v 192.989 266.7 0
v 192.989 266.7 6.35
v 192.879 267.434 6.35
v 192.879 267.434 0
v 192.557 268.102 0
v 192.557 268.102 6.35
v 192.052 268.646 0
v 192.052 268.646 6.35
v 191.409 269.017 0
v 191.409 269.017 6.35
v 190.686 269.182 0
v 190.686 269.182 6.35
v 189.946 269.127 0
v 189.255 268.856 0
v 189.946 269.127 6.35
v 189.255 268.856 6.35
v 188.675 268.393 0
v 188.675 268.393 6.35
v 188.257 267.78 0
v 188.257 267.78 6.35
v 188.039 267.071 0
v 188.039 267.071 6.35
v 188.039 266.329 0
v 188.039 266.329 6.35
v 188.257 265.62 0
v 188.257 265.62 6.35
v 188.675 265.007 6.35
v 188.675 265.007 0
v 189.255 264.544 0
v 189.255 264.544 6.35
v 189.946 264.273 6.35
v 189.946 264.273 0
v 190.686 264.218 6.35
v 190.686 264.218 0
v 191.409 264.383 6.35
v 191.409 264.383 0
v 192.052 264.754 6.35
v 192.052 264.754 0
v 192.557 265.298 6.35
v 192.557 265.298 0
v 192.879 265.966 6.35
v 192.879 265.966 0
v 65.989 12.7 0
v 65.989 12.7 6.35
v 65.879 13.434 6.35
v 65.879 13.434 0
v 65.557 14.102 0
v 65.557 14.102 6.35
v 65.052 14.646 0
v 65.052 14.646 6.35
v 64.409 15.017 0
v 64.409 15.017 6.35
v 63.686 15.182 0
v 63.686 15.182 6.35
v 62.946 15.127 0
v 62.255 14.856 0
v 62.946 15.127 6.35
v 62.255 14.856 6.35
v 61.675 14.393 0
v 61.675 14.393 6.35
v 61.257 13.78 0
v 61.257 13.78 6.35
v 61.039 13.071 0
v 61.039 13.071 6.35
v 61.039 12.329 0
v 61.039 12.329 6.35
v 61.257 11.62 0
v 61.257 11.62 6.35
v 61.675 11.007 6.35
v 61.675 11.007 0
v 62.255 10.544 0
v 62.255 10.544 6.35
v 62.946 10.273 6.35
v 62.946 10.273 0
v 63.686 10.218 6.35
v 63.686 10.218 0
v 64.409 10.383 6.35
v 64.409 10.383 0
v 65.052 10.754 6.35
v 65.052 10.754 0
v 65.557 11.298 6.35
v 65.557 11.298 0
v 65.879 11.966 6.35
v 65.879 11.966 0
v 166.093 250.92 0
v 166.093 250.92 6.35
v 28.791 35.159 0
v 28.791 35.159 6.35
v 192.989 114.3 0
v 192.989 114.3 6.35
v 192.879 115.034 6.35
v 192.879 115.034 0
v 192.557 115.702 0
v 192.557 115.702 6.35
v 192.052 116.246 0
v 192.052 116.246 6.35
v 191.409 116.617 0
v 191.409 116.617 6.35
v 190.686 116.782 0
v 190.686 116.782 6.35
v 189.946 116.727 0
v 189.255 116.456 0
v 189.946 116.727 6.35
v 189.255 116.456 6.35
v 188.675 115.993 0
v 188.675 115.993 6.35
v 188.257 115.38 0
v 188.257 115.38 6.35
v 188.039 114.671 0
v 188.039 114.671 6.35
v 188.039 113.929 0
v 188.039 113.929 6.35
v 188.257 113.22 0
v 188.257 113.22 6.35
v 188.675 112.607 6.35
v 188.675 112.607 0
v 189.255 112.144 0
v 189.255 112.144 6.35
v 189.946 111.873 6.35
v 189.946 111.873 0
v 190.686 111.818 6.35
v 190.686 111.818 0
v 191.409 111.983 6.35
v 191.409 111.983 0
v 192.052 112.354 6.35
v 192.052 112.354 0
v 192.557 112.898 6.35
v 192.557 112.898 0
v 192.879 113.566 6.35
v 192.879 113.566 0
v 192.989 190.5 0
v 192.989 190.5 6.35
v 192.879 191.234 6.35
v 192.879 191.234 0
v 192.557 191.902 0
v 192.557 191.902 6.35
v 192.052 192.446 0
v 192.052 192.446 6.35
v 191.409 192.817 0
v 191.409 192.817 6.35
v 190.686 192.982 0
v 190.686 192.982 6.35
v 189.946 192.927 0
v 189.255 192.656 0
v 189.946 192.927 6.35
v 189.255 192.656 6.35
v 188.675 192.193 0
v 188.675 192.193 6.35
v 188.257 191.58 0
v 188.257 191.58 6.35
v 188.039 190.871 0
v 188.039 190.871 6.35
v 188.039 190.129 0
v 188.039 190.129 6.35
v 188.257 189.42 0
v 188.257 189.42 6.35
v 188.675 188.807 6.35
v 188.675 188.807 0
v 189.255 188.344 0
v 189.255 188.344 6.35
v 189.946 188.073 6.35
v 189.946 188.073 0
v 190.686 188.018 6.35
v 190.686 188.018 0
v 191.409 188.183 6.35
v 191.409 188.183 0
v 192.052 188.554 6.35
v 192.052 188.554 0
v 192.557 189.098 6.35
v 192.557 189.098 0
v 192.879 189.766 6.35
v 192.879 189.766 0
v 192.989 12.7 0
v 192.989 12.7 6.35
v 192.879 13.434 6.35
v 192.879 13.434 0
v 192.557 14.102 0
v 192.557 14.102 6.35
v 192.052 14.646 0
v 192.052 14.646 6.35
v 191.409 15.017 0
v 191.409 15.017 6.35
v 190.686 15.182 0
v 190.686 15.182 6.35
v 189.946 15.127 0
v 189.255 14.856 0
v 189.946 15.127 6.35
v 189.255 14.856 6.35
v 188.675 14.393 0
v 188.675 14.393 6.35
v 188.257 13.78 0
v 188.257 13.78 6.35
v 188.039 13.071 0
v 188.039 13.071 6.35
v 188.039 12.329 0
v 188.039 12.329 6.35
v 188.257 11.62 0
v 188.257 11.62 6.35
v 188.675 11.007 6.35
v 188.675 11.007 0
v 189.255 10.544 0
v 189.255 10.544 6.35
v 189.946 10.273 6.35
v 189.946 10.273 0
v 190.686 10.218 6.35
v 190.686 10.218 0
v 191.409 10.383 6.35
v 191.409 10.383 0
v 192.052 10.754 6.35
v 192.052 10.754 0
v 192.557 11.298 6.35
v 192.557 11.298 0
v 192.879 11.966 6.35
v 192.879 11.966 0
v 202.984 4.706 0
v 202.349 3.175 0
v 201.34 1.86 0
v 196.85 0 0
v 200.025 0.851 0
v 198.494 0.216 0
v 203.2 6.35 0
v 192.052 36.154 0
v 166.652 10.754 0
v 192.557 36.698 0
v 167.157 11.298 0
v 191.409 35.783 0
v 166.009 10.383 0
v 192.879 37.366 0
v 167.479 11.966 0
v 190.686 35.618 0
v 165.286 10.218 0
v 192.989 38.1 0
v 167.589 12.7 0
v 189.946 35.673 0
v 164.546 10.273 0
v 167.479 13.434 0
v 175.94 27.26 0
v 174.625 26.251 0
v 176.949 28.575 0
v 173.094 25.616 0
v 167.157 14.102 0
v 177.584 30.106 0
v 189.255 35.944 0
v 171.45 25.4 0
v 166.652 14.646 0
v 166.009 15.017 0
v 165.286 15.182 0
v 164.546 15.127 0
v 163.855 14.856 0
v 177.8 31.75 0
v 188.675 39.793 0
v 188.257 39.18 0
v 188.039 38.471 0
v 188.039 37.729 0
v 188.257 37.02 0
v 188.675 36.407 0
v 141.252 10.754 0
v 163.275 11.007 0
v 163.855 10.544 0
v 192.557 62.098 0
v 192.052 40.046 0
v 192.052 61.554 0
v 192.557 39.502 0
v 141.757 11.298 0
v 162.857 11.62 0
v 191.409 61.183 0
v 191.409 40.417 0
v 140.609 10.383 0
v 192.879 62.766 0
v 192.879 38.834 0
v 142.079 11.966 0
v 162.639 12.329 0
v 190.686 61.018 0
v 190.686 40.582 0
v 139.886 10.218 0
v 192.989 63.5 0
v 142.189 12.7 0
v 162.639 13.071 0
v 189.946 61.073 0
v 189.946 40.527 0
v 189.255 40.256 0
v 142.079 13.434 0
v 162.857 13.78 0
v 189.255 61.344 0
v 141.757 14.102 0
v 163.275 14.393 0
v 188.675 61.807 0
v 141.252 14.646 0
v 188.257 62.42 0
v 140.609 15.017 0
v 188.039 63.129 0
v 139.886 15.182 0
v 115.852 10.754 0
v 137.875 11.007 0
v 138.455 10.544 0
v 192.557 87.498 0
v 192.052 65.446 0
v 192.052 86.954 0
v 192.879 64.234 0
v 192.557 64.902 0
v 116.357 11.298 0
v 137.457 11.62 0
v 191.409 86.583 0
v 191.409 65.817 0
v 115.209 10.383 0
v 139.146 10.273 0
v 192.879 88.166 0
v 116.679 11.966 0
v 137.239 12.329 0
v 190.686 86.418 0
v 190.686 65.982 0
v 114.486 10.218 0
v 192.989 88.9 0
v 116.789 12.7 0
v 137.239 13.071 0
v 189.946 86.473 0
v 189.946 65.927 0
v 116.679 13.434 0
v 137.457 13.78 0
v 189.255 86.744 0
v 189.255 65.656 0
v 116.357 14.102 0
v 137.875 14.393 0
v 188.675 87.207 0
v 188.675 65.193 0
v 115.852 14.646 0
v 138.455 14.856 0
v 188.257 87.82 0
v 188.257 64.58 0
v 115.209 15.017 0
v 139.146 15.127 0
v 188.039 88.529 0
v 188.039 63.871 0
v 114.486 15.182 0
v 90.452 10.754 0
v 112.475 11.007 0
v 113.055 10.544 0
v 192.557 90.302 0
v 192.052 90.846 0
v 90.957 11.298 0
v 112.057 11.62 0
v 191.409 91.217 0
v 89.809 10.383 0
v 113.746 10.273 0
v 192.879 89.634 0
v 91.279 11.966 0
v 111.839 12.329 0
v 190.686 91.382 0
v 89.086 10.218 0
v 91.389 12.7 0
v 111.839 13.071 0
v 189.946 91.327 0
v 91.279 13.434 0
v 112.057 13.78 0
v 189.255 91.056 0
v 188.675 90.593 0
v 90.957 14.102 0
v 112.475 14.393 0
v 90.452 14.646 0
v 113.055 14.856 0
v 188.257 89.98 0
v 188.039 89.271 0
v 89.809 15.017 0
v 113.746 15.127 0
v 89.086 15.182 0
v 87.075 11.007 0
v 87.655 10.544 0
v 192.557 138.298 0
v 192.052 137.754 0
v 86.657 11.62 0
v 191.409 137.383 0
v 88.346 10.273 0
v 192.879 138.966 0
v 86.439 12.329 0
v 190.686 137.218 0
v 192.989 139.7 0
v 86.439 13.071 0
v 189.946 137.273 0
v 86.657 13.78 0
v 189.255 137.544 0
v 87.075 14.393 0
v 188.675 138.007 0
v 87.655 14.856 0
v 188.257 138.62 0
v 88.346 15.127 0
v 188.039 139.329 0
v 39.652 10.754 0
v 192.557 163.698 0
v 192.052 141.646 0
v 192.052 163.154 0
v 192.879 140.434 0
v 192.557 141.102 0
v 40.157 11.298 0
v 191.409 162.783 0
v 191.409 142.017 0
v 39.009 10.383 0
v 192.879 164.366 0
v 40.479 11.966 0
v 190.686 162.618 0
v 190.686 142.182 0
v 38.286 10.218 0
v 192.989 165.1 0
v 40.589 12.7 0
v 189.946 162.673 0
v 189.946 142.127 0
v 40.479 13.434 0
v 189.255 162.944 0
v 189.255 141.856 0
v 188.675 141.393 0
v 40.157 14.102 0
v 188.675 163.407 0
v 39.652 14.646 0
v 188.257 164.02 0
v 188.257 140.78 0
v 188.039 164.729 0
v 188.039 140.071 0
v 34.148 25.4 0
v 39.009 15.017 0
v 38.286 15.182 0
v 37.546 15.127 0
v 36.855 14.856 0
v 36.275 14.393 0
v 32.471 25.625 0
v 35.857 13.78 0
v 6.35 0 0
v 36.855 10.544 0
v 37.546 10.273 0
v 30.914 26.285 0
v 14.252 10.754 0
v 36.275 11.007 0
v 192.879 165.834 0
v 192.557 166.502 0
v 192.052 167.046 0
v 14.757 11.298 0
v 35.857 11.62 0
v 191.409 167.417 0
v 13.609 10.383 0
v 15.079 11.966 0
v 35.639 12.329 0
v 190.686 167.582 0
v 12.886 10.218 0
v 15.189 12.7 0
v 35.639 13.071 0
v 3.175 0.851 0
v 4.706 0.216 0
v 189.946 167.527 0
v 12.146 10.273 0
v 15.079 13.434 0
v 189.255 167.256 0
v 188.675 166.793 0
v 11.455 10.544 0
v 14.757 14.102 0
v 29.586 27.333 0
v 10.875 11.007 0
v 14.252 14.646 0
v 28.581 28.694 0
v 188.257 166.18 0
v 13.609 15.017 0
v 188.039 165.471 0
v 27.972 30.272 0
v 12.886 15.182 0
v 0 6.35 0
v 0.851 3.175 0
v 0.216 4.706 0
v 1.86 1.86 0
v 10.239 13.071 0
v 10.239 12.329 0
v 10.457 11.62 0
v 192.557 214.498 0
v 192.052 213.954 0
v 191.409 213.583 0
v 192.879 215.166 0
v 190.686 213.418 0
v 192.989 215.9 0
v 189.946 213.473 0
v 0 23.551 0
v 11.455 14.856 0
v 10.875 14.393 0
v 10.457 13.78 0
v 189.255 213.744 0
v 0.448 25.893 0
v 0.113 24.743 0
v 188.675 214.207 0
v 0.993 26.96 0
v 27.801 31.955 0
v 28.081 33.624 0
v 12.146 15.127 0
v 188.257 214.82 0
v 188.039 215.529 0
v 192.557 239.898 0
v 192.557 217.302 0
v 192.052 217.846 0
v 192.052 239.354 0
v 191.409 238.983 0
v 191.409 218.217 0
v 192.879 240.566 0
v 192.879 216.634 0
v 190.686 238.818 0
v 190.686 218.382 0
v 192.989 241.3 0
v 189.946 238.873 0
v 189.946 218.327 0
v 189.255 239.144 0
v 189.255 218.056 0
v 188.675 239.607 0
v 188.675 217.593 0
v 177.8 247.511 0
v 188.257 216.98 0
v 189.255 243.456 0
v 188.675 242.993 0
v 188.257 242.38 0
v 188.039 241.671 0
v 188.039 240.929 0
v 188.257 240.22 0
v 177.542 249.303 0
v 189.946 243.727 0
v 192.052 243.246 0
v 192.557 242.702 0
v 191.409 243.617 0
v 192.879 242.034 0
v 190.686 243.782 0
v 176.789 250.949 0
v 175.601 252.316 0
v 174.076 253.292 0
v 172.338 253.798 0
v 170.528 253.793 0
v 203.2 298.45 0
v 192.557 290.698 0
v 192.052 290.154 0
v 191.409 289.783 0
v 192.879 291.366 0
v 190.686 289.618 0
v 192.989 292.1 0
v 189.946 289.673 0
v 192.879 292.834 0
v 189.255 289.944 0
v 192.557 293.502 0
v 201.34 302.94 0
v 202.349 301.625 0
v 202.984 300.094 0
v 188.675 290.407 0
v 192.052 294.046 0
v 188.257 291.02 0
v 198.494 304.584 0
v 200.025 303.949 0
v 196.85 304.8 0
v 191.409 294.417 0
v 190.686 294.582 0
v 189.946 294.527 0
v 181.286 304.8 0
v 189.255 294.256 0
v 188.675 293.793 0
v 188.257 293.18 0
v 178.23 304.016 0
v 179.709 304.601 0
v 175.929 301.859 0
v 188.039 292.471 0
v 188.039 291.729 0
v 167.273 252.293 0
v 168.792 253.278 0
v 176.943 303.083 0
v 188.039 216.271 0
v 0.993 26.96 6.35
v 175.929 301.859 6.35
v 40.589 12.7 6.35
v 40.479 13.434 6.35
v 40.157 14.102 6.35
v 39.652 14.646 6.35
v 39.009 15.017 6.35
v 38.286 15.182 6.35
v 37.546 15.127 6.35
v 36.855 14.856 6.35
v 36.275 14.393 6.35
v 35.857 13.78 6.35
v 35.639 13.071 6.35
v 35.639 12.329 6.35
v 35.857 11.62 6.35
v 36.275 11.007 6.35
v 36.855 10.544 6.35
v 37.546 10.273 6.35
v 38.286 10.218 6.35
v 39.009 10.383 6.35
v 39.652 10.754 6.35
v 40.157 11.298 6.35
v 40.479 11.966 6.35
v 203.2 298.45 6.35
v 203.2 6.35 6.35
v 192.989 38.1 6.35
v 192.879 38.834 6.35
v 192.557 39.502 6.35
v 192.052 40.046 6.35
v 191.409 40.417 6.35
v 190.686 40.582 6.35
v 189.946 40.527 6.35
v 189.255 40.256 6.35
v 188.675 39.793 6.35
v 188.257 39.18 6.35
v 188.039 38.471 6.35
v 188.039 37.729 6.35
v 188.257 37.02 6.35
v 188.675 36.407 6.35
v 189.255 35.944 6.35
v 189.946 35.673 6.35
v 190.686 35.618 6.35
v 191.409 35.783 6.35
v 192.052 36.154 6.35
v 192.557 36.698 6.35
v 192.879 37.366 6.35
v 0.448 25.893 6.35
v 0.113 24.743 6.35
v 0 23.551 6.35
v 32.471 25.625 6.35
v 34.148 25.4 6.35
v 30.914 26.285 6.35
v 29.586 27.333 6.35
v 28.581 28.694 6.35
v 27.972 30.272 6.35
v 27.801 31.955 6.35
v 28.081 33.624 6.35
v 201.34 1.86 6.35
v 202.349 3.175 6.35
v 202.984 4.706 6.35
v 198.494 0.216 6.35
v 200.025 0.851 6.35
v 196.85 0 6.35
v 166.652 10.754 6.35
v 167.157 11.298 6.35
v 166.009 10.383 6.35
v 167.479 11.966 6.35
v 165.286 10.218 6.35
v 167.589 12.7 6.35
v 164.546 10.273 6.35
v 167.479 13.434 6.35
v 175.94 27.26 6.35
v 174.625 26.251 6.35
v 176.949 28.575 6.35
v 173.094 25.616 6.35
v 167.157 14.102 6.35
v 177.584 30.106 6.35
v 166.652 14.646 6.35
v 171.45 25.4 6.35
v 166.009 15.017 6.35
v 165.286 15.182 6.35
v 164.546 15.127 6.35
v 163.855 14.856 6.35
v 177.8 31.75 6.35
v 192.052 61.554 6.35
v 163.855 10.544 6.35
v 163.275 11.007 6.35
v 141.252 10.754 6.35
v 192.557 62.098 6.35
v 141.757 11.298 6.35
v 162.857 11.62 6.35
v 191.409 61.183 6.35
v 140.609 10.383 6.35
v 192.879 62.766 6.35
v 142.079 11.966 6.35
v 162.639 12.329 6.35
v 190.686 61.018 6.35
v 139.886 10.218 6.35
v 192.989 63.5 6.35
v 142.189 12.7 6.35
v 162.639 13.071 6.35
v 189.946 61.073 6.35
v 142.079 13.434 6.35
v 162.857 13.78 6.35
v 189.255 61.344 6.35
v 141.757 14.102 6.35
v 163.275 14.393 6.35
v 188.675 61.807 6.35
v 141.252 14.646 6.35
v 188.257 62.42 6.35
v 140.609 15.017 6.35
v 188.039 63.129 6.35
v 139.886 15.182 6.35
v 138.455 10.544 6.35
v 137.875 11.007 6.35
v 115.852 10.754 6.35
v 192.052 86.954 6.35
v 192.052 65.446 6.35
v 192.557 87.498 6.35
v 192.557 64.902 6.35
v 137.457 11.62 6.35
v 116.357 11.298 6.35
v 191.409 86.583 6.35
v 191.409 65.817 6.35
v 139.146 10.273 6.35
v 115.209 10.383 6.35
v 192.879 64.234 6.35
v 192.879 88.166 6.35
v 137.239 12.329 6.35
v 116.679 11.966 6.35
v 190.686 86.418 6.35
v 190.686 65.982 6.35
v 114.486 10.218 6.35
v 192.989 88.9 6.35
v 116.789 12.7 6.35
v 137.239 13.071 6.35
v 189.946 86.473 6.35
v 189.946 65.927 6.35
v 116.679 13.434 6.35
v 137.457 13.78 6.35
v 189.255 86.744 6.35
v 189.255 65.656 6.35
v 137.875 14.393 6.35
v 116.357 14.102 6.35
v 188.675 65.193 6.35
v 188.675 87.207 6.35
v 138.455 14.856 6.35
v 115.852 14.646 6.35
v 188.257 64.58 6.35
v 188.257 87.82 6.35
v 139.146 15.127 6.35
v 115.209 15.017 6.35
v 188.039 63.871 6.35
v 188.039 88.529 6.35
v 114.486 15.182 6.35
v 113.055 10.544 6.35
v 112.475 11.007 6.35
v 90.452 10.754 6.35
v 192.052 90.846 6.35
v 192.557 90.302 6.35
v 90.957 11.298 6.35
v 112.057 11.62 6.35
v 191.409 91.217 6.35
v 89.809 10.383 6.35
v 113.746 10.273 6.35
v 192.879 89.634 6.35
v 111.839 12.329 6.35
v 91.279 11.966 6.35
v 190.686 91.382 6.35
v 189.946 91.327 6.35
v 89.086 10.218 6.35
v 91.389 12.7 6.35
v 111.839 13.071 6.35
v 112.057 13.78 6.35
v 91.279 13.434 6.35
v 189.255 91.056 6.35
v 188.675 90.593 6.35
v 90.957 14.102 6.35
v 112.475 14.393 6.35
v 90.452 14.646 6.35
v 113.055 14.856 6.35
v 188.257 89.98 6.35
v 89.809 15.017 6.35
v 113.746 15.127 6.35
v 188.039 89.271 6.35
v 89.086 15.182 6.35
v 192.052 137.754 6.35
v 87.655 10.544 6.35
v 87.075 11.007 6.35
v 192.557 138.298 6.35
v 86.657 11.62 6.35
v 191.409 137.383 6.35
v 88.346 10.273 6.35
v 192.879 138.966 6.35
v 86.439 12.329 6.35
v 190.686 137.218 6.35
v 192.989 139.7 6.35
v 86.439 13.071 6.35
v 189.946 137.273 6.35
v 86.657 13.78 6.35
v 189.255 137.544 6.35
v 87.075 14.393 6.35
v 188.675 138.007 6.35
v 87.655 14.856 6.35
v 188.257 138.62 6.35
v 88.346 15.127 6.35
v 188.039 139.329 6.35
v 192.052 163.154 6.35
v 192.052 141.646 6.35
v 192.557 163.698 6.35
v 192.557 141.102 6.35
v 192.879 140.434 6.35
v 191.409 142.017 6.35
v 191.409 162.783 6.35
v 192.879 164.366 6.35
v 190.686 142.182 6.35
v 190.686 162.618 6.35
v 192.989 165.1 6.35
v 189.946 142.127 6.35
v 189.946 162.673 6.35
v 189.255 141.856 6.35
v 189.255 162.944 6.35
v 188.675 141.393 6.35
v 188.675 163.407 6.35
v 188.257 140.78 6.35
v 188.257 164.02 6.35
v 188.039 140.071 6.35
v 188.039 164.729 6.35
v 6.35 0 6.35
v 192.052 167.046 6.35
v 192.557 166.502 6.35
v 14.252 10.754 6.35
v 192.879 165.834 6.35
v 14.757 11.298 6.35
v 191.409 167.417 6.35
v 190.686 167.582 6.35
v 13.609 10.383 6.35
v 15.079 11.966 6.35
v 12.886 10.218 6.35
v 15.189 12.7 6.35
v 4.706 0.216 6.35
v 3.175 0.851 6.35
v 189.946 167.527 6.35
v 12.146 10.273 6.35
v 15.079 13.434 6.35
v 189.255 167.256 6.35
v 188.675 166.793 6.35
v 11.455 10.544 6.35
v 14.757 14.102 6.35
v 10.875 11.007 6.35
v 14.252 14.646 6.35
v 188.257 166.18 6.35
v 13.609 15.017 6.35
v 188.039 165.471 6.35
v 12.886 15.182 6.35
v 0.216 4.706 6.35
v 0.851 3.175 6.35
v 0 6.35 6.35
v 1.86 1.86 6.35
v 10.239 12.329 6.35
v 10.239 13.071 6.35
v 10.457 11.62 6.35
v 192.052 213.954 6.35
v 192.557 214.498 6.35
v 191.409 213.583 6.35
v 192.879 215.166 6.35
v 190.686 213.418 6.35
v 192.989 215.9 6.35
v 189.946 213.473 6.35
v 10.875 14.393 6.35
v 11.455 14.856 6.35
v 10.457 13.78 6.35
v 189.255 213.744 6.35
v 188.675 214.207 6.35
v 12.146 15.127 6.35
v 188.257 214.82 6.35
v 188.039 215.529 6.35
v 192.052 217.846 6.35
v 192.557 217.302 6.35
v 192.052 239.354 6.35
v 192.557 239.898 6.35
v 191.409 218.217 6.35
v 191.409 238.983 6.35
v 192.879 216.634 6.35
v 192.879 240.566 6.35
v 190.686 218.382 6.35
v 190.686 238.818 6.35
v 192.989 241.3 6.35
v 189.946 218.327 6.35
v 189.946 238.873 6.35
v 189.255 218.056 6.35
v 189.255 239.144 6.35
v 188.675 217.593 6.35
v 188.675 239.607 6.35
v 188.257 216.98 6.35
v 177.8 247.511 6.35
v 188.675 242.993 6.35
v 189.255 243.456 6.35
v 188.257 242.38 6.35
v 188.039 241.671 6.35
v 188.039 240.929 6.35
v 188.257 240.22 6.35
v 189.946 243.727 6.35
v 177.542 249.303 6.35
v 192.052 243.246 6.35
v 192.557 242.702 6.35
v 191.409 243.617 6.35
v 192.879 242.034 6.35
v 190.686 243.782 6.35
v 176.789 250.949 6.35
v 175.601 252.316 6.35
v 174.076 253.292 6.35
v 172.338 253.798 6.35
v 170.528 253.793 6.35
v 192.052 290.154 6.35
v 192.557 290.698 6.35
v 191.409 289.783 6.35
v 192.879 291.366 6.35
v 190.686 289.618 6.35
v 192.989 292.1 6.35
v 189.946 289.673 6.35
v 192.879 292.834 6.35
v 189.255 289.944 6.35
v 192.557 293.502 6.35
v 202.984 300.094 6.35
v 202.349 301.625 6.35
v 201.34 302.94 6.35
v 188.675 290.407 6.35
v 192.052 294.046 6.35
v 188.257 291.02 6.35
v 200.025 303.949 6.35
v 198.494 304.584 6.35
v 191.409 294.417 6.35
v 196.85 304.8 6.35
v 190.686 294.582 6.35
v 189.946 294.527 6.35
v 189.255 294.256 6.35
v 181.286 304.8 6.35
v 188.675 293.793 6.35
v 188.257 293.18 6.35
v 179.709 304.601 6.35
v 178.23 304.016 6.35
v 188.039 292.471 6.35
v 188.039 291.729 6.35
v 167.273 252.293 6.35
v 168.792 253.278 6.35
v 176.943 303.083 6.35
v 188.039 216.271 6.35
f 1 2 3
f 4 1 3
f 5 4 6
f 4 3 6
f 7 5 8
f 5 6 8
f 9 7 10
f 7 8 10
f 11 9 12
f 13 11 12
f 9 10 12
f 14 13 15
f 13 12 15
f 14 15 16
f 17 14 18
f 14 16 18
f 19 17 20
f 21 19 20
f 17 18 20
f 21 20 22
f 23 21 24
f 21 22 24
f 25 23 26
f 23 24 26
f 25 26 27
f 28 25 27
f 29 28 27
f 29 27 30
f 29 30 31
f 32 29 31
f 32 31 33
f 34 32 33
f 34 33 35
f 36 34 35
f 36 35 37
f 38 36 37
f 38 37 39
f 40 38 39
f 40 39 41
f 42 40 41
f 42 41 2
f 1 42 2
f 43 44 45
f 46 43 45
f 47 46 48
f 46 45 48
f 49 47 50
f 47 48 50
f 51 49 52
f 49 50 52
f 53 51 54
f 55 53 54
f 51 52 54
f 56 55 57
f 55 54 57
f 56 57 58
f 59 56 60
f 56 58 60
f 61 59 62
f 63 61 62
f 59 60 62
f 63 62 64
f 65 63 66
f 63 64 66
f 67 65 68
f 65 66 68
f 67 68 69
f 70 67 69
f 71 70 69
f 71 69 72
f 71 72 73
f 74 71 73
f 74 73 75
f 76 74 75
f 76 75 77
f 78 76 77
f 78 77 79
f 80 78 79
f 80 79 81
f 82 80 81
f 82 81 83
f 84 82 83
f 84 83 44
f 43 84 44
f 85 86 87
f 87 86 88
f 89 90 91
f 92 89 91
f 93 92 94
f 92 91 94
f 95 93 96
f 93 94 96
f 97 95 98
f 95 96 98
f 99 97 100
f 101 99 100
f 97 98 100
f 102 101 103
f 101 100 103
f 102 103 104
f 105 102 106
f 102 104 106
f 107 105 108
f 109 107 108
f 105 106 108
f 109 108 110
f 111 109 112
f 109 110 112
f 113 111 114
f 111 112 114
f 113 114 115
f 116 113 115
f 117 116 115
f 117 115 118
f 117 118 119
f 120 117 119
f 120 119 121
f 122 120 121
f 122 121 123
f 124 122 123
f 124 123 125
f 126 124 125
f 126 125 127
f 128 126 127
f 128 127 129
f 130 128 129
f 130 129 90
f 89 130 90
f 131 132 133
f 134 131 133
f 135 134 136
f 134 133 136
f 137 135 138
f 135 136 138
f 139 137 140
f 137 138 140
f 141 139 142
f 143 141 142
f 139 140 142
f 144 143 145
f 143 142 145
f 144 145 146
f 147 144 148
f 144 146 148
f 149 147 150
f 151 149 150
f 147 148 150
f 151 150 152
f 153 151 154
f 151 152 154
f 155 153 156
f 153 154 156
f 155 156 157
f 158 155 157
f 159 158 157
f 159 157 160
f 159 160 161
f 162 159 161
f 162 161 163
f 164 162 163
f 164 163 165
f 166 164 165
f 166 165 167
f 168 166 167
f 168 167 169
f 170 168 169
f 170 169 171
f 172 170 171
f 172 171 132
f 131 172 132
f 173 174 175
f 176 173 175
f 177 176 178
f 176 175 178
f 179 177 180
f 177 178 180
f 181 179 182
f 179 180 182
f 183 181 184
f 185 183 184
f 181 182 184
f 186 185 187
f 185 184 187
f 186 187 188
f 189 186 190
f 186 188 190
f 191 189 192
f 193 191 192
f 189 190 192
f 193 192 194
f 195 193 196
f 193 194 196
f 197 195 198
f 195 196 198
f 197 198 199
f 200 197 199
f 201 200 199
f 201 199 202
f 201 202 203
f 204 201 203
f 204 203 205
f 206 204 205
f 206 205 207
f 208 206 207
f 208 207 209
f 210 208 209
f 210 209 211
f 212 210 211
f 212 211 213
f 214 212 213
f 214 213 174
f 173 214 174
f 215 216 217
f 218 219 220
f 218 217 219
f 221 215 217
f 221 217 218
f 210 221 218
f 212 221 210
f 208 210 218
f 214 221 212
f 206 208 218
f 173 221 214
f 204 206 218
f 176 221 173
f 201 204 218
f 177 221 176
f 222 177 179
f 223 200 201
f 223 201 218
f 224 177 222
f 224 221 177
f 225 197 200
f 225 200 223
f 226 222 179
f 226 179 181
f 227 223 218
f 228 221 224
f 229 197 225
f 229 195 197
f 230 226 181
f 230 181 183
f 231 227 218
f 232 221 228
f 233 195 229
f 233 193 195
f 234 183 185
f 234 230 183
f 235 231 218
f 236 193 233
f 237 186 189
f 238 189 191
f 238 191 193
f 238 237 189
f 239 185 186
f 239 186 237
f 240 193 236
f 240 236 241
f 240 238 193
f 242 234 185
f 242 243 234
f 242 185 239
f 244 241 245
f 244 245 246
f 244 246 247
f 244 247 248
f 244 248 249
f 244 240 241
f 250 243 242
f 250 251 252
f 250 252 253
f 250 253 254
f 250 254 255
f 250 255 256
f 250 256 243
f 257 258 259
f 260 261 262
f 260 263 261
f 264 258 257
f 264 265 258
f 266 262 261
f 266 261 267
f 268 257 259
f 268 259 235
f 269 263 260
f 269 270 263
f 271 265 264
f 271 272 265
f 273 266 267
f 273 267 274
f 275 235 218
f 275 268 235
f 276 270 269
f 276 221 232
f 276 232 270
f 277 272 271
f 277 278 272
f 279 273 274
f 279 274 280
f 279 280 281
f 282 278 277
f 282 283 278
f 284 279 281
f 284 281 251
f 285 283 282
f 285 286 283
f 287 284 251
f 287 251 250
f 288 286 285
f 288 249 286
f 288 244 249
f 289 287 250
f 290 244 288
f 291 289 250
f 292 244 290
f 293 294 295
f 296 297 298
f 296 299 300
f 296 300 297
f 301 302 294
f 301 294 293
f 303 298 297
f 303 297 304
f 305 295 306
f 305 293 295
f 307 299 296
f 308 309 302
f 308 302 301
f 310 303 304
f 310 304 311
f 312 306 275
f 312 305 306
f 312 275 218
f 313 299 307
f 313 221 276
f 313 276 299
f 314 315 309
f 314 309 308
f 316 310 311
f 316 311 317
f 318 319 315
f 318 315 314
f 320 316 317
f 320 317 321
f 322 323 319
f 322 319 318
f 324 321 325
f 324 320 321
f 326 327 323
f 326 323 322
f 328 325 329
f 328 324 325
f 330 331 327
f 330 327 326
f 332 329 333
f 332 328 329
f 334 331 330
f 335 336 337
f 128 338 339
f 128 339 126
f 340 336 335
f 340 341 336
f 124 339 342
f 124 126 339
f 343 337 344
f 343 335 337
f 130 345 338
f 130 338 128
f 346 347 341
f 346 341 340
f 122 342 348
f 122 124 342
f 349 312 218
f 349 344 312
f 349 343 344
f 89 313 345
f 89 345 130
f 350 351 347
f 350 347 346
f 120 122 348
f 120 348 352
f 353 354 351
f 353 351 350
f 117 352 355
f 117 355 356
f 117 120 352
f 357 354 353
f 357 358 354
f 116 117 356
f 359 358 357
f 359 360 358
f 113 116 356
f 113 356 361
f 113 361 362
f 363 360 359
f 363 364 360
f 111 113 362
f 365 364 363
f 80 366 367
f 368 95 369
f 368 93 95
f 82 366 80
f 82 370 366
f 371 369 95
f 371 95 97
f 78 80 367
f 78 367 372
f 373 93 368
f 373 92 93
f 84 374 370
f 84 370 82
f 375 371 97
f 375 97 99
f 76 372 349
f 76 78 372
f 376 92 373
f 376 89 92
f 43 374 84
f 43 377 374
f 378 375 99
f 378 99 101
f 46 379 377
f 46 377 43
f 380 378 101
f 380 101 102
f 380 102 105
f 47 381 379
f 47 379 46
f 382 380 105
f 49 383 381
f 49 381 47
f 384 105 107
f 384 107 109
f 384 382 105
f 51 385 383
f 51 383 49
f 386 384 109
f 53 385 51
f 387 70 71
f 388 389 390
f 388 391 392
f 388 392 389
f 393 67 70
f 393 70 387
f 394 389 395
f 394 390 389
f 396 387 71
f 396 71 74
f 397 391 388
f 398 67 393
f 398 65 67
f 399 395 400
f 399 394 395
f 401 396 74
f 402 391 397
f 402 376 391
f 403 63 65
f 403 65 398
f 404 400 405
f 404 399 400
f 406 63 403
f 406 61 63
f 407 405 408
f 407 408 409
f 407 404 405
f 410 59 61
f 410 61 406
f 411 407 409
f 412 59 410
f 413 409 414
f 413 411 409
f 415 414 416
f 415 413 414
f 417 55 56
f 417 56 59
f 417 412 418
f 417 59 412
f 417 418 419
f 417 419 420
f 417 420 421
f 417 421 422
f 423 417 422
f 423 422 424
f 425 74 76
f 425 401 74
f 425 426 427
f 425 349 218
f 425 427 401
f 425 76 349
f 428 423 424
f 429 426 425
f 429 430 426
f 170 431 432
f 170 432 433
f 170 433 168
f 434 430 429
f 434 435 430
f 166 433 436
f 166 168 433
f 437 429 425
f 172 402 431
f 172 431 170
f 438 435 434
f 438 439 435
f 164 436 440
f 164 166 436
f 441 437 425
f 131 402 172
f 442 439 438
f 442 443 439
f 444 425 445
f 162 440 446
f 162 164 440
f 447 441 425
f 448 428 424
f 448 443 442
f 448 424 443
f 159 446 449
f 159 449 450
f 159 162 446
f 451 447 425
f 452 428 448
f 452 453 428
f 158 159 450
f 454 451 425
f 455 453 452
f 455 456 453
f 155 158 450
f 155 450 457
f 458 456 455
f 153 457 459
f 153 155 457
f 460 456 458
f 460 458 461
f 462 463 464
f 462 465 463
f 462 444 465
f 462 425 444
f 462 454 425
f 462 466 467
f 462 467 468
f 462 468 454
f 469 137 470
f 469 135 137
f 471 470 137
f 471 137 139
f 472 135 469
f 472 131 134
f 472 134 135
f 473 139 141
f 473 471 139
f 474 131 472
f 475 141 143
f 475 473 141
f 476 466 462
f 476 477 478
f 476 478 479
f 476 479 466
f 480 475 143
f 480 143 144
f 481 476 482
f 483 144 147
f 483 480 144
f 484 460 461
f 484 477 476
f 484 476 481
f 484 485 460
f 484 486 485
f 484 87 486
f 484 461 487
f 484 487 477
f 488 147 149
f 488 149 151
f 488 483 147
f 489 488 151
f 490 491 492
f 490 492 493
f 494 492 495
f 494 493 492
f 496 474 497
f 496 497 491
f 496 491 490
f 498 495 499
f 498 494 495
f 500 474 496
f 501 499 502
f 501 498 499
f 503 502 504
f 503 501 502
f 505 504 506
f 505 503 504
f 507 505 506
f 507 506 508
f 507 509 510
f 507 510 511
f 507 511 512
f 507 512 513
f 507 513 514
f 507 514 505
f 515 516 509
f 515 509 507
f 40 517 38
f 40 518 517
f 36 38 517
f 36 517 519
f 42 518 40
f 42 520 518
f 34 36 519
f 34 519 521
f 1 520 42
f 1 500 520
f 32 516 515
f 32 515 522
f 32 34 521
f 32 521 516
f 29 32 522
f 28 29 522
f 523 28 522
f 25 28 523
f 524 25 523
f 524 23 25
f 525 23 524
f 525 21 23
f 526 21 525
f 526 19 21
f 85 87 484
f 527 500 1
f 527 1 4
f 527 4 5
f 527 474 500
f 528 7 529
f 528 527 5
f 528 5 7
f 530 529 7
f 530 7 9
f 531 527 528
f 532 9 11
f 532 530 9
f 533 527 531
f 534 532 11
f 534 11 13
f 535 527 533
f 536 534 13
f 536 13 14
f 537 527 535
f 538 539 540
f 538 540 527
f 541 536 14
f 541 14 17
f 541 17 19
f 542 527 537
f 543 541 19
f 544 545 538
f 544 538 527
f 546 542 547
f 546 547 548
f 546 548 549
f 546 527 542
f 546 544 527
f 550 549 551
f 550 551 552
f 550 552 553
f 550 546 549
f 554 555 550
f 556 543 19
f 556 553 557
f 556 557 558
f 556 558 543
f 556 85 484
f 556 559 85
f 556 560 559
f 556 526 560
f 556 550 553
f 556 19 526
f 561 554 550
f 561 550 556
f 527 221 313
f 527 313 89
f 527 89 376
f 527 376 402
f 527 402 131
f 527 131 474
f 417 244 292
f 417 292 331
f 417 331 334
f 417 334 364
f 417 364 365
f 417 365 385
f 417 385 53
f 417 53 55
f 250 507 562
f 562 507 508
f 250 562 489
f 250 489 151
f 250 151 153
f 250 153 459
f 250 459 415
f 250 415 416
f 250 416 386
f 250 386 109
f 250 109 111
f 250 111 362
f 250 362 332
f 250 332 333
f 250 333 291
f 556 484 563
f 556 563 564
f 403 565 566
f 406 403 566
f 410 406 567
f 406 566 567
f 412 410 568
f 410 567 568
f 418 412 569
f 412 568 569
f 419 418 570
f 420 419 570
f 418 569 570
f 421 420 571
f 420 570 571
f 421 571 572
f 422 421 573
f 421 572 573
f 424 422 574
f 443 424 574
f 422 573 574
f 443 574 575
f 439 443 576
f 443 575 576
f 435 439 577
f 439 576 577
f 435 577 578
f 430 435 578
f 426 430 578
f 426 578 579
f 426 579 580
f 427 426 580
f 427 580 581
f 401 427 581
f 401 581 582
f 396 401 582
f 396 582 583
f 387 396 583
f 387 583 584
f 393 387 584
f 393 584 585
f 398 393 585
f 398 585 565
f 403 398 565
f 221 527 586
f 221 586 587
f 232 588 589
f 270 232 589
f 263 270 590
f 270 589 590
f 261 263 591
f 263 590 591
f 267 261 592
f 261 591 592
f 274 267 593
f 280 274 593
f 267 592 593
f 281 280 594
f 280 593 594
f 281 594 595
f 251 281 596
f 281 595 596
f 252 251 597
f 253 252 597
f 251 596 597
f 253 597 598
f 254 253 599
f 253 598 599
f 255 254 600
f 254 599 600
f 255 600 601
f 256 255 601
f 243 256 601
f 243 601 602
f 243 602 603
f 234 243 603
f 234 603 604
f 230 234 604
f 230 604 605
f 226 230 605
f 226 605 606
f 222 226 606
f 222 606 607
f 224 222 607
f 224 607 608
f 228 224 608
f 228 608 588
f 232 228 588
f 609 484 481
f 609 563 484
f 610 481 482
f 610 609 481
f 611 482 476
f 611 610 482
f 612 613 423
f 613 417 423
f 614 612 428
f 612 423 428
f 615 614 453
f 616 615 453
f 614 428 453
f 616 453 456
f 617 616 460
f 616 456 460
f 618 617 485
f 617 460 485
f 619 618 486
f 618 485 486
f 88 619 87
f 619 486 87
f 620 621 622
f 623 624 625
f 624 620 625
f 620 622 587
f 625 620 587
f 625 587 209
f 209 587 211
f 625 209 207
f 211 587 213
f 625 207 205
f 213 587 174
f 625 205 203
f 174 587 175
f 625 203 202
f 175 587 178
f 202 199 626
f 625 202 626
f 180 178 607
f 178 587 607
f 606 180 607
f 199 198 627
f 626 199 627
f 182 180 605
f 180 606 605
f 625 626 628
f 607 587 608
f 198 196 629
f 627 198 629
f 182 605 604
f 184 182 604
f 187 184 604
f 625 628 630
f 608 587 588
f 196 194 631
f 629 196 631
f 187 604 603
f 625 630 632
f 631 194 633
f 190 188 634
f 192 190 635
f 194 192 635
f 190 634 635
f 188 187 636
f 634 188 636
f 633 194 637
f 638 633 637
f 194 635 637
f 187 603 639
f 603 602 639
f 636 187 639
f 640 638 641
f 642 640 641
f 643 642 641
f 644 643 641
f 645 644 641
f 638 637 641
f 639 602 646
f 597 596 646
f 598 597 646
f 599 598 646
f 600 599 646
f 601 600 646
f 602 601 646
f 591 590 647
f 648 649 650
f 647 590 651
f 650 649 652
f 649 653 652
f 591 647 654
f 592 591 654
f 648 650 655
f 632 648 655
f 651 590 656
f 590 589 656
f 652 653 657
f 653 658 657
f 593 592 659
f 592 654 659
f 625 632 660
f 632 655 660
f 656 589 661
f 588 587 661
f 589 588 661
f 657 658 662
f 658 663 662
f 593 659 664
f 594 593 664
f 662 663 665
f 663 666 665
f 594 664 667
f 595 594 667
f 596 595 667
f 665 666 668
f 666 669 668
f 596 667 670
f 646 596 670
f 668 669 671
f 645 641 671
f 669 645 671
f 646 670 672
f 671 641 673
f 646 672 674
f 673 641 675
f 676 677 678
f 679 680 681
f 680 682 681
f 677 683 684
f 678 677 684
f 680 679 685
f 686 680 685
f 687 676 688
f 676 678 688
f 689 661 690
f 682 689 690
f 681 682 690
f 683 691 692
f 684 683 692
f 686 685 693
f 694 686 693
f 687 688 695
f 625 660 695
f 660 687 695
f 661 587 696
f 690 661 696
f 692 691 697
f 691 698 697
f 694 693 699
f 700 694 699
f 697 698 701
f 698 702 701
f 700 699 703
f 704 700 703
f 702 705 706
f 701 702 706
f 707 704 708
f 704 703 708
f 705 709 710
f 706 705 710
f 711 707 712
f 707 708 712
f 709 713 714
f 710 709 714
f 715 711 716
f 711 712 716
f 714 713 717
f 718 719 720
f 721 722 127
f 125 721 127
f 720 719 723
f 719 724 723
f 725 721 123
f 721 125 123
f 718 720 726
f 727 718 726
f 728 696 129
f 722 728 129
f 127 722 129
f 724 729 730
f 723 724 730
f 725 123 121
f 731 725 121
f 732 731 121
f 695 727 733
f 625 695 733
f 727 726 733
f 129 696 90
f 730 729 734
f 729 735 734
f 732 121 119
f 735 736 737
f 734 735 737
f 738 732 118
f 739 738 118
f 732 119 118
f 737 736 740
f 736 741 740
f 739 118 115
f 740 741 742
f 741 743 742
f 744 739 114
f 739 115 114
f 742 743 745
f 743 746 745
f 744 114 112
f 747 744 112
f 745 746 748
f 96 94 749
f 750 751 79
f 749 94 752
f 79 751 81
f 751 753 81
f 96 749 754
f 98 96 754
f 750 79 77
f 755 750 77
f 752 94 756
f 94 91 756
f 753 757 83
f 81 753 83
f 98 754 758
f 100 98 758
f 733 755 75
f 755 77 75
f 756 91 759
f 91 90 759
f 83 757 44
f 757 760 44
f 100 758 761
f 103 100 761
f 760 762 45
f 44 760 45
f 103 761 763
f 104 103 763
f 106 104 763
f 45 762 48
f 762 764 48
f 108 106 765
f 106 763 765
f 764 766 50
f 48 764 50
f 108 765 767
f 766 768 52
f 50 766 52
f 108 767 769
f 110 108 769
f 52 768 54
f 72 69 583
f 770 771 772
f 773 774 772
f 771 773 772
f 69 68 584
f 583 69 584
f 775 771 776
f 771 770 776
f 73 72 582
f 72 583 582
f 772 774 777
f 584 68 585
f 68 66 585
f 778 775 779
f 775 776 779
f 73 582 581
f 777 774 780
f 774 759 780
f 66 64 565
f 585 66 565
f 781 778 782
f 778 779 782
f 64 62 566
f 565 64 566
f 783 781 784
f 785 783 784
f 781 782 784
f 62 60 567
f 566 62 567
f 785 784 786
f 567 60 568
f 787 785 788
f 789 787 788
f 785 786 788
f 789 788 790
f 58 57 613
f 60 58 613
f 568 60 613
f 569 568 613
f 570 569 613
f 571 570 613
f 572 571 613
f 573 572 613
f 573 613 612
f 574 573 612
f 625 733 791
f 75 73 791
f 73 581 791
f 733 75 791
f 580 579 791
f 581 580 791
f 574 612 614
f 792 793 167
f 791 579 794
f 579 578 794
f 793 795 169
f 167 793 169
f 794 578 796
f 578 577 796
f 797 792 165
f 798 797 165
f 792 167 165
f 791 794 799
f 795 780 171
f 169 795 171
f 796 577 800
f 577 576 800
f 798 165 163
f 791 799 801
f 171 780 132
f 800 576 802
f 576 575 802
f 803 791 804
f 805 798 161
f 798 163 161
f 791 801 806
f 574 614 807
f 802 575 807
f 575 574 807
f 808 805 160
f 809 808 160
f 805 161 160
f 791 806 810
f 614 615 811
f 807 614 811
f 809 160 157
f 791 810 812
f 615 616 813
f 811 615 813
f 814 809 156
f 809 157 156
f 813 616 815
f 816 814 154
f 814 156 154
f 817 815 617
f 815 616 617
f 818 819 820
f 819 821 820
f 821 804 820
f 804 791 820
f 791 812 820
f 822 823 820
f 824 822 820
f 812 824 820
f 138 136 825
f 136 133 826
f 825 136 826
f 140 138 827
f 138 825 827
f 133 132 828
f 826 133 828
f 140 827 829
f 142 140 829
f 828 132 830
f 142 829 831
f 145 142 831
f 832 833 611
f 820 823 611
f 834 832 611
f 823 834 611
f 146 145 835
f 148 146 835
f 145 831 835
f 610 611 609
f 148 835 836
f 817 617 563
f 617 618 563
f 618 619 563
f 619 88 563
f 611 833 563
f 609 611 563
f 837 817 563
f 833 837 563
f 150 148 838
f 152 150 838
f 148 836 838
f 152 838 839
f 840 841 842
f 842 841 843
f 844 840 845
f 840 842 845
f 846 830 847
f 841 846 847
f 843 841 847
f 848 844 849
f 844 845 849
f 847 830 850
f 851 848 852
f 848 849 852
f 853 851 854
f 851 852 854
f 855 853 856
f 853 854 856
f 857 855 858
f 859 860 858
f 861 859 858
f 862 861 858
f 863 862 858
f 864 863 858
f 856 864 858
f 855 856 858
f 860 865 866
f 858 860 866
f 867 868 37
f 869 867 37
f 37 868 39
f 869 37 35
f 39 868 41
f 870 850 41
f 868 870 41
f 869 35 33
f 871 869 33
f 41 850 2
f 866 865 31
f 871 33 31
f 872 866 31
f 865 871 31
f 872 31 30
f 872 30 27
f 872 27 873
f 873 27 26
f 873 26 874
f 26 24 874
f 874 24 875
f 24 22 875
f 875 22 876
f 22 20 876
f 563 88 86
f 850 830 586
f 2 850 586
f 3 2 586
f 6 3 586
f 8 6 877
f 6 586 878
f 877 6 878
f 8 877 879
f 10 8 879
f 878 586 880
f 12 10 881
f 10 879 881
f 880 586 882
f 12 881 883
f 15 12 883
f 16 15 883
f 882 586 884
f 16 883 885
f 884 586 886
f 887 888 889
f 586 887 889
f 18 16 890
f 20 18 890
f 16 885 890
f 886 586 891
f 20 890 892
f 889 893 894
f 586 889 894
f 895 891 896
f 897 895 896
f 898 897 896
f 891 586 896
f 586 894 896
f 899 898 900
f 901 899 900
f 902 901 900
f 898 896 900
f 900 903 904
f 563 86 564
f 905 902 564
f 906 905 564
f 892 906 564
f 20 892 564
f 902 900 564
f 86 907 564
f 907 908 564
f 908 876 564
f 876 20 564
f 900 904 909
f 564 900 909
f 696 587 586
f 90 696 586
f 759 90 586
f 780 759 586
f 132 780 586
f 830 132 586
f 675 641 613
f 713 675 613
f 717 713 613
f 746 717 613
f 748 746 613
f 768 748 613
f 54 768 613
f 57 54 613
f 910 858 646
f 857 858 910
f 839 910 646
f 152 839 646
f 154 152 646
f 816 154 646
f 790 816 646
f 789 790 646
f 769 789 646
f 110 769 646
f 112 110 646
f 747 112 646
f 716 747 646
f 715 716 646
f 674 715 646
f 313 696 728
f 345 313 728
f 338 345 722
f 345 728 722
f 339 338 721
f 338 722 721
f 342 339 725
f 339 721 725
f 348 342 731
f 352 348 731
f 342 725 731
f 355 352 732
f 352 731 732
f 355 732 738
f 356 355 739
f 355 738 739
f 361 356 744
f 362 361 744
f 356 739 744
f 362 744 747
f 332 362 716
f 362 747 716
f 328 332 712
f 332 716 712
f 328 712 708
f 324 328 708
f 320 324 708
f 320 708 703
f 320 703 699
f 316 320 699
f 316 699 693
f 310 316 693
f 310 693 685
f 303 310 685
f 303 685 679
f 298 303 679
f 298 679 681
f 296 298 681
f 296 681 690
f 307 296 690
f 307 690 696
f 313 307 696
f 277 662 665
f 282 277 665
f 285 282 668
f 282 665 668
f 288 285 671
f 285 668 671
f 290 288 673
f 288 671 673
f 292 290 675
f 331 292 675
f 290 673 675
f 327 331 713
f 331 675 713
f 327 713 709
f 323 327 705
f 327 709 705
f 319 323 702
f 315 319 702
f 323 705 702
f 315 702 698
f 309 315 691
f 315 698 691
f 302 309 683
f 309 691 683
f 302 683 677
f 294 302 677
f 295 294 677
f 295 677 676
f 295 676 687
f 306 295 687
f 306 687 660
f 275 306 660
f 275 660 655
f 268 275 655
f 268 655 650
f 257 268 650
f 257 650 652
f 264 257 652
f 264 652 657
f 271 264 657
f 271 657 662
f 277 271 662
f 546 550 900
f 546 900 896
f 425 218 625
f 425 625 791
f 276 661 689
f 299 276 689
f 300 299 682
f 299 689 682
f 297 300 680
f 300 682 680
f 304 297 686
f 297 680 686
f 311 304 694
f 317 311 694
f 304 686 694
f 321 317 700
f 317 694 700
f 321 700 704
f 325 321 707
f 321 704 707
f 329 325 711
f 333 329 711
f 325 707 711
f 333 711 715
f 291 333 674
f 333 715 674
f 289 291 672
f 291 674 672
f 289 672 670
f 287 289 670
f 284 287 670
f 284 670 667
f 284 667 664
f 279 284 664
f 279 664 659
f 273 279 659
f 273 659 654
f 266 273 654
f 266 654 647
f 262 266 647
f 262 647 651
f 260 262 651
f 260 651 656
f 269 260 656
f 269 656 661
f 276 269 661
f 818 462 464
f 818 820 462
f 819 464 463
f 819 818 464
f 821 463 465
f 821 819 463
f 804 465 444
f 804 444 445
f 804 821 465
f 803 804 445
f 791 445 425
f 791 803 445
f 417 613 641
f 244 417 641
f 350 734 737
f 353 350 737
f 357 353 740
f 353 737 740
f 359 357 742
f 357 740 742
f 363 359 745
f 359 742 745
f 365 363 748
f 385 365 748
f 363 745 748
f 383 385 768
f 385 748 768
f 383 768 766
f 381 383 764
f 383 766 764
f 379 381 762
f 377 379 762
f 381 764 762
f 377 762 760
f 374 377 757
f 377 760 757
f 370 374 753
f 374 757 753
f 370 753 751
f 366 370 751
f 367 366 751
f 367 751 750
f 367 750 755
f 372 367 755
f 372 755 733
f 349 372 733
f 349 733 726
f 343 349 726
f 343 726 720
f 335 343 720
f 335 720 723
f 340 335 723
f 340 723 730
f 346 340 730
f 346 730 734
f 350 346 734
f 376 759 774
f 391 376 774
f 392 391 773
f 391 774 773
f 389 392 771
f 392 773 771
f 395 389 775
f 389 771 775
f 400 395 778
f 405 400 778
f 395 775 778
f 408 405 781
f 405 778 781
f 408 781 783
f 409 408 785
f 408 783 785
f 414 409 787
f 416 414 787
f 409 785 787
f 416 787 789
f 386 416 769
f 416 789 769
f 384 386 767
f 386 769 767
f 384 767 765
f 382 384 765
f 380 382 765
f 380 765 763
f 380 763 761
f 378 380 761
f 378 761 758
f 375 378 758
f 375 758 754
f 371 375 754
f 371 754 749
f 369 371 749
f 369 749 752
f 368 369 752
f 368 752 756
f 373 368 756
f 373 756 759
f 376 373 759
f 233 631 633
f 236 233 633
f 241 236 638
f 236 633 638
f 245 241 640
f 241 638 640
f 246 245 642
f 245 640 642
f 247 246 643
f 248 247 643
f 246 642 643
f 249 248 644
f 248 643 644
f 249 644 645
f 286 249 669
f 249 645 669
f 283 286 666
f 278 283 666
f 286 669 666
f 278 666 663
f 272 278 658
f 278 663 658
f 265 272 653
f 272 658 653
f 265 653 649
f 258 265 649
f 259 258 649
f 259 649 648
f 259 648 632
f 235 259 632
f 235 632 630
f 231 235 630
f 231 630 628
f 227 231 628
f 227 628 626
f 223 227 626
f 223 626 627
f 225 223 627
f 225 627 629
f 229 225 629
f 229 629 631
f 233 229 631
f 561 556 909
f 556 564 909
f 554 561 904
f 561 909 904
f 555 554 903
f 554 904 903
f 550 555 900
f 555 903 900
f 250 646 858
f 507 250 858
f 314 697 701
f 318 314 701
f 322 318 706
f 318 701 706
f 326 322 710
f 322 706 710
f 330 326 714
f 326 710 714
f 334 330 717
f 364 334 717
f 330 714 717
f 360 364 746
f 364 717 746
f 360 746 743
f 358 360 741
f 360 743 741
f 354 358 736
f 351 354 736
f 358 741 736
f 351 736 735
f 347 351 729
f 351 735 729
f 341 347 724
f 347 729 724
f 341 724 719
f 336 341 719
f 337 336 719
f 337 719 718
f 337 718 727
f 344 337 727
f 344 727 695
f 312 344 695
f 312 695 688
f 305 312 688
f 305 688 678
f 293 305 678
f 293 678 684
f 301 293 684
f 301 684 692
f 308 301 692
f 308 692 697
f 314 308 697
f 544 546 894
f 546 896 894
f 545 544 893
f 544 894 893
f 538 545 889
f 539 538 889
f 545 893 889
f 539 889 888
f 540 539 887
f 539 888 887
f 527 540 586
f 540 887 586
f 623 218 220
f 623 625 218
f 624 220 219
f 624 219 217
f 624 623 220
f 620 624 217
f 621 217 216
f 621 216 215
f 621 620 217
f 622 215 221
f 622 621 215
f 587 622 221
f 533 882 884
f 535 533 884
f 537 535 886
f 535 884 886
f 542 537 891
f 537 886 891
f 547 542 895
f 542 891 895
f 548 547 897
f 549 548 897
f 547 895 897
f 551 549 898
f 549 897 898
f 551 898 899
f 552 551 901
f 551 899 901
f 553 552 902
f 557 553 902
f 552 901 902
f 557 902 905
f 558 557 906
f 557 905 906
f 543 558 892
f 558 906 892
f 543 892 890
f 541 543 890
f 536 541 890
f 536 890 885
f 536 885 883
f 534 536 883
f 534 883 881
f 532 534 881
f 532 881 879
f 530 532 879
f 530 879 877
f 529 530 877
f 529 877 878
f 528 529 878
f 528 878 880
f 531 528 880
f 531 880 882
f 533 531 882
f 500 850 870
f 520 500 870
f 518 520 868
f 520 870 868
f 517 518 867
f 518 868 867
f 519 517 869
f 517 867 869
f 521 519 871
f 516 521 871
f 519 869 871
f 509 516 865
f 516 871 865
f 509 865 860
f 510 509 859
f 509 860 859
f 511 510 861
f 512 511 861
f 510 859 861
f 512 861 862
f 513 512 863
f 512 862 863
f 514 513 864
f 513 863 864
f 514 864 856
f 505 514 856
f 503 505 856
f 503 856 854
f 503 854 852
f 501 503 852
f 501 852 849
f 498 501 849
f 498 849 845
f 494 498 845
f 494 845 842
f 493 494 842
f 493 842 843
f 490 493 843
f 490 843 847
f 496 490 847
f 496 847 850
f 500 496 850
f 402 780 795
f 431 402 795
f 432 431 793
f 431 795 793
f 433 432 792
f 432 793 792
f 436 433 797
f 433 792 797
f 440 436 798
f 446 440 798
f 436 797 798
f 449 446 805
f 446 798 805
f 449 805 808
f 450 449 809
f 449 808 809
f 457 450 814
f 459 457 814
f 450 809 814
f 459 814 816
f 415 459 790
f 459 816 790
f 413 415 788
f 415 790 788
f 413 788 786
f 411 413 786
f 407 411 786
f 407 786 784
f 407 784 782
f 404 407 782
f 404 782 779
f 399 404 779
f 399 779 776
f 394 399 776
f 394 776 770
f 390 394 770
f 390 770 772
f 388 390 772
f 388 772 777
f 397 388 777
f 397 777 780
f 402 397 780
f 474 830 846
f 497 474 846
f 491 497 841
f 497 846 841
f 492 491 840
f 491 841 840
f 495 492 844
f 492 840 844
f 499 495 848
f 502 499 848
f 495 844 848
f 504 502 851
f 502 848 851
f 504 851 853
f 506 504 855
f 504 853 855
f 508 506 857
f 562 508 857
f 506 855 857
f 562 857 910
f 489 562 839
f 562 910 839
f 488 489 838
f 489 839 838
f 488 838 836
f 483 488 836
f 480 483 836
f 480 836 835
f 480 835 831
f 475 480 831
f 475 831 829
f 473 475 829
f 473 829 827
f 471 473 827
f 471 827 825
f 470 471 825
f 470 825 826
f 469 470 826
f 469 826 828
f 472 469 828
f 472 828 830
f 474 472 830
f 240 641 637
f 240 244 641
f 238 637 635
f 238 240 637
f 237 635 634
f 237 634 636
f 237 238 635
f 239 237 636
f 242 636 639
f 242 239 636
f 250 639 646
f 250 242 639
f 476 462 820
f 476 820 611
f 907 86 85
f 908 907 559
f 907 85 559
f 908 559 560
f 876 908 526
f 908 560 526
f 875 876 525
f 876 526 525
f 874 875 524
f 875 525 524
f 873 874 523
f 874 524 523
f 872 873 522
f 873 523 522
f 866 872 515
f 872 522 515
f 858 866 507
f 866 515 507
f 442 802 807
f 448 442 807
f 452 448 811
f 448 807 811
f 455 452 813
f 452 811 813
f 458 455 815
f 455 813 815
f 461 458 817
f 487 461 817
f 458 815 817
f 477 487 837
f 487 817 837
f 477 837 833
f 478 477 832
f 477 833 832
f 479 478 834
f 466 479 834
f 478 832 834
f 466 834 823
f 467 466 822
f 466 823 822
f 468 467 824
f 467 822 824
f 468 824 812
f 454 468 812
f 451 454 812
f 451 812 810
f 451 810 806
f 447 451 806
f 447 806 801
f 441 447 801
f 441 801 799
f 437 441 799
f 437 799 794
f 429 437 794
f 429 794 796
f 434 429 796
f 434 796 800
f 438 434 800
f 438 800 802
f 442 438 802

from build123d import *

# Parameters (mm, degrees)
BOSS_EXTRUDE1_DEPTH = 6.35
SKETCH2_R           = 2.4892
CUT_EXTRUDE1_DEPTH  = 7.35
FILLET1_R           = 6.35


with BuildPart() as part:
    # Sketch1 → Boss-Extrude1 (new body)
    with BuildSketch(Plane.XY):
        Polygon((0, 25.4), (177.8, 304.8), (203.2, 304.8), (203.2, 0), (0, 0), align=None)
    extrude(amount=BOSS_EXTRUDE1_DEPTH)

    # Sketch2 → Cut-Extrude1 (cut, through all)
    with BuildSketch(Plane.XY.offset(6.35)):
        with Locations((190.5, 12.7)):
            Circle(SKETCH2_R)
        with Locations((165.1, 12.7)):
            Circle(SKETCH2_R)
        with Locations((139.7, 12.7)):
            Circle(SKETCH2_R)
        with Locations((114.3, 12.7)):
            Circle(SKETCH2_R)
        with Locations((88.9, 12.7)):
            Circle(SKETCH2_R)
        with Locations((63.5, 12.7)):
            Circle(SKETCH2_R)
        with Locations((38.1, 12.7)):
            Circle(SKETCH2_R)
        with Locations((190.5, 38.1)):
            Circle(SKETCH2_R)
        with Locations((190.5, 63.5)):
            Circle(SKETCH2_R)
        with Locations((190.5, 88.9)):
            Circle(SKETCH2_R)
        with Locations((190.5, 114.3)):
            Circle(SKETCH2_R)
        with Locations((190.5, 139.7)):
            Circle(SKETCH2_R)
        with Locations((190.5, 165.1)):
            Circle(SKETCH2_R)
        with Locations((190.5, 190.5)):
            Circle(SKETCH2_R)
        with Locations((190.5, 215.9)):
            Circle(SKETCH2_R)
        with Locations((190.5, 241.3)):
            Circle(SKETCH2_R)
        with Locations((190.5, 266.7)):
            Circle(SKETCH2_R)
        with Locations((190.5, 292.1)):
            Circle(SKETCH2_R)
        with Locations((12.7, 12.7)):
            Circle(SKETCH2_R)
        Polygon((22.580146513, 25.4), (177.8, 25.4), (177.8, 269.316912623), align=None)
    extrude(amount=-CUT_EXTRUDE1_DEPTH, mode=Mode.SUBTRACT)

    # Fillet1
    fillet1_edges = [part.edges().sort_by_distance(p)[0] for p in [
        (22.580146513, 25.4, 3.175),
        (177.8, 269.316912623, 3.175),
        (177.8, 25.4, 3.175),
        (203.2, 0, 3.175),
        (0, 0, 3.175),
        (0, 25.4, 3.175),
        (177.8, 304.8, 3.175),
        (203.2, 304.8, 3.175),
    ]]
    fillet(fillet1_edges, radius=FILLET1_R)


solid = part.part
